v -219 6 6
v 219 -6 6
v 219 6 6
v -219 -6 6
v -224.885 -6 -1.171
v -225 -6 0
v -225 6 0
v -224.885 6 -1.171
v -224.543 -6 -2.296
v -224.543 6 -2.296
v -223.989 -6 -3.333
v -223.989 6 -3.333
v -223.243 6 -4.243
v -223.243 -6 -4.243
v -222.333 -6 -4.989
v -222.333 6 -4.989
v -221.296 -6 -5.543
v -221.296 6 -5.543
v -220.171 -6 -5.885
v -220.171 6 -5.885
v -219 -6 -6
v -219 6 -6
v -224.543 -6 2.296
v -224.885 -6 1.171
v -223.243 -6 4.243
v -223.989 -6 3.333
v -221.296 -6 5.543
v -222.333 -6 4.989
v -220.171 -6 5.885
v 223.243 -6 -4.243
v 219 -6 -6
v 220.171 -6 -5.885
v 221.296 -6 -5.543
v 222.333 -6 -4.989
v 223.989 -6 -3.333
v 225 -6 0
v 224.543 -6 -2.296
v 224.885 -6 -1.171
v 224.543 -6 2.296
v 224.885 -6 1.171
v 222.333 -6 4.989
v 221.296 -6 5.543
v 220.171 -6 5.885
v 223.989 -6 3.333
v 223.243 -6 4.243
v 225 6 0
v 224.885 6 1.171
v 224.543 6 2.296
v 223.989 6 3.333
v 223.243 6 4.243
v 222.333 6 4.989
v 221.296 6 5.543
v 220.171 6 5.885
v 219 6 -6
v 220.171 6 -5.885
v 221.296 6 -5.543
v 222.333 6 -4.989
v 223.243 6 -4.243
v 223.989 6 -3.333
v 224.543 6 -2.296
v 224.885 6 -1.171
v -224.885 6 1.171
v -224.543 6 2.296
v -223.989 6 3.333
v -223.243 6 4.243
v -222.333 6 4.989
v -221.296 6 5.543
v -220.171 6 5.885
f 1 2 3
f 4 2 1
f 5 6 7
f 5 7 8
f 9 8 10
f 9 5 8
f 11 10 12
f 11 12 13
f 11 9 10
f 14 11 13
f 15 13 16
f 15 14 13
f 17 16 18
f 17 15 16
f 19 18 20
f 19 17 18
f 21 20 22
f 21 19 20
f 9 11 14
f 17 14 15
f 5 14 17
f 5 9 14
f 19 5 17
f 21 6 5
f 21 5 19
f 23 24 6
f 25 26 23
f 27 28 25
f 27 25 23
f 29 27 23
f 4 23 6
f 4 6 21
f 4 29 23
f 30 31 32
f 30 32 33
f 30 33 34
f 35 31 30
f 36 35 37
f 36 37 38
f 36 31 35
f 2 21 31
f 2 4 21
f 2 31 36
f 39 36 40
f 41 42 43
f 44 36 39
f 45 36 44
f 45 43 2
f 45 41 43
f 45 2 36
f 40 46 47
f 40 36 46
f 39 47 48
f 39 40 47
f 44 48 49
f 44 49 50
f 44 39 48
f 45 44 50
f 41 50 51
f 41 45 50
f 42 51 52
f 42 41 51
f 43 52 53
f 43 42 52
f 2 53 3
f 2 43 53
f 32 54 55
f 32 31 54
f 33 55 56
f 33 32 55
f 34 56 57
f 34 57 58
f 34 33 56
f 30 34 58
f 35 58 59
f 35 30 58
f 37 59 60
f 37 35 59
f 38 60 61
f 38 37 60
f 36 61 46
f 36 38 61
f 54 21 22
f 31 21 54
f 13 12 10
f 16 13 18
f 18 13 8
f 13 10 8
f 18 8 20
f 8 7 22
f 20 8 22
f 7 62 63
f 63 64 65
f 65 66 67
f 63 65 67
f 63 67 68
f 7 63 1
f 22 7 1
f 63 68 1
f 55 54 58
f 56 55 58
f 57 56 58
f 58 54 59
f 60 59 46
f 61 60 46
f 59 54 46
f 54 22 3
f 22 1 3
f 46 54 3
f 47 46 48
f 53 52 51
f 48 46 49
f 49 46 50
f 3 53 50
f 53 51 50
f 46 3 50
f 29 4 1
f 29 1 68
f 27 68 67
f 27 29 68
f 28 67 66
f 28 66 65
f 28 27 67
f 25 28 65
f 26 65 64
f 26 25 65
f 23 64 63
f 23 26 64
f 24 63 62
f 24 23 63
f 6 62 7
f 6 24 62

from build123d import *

# Parameters (mm, degrees)
F1_DEPTH = 6


with BuildPart() as f1:
    # F0 (on Front) → F1 (new body, symmetric)
    with BuildSketch(Plane.XZ):
        with BuildLine():
            Line((219, 6), (-219, 6))
            ThreePointArc((-219, 6), (-223.242641, 4.242641), (-225, 0))
            ThreePointArc((-225, 0), (-223.242641, -4.242641), (-219, -6))
            Line((-219, -6), (219, -6))
            ThreePointArc((219, -6), (223.242641, -4.242641), (225, 0))
            ThreePointArc((225, 0), (223.242641, 4.242641), (219, 6))
        make_face()
    extrude(amount=F1_DEPTH, both=True)


solid = f1.part
